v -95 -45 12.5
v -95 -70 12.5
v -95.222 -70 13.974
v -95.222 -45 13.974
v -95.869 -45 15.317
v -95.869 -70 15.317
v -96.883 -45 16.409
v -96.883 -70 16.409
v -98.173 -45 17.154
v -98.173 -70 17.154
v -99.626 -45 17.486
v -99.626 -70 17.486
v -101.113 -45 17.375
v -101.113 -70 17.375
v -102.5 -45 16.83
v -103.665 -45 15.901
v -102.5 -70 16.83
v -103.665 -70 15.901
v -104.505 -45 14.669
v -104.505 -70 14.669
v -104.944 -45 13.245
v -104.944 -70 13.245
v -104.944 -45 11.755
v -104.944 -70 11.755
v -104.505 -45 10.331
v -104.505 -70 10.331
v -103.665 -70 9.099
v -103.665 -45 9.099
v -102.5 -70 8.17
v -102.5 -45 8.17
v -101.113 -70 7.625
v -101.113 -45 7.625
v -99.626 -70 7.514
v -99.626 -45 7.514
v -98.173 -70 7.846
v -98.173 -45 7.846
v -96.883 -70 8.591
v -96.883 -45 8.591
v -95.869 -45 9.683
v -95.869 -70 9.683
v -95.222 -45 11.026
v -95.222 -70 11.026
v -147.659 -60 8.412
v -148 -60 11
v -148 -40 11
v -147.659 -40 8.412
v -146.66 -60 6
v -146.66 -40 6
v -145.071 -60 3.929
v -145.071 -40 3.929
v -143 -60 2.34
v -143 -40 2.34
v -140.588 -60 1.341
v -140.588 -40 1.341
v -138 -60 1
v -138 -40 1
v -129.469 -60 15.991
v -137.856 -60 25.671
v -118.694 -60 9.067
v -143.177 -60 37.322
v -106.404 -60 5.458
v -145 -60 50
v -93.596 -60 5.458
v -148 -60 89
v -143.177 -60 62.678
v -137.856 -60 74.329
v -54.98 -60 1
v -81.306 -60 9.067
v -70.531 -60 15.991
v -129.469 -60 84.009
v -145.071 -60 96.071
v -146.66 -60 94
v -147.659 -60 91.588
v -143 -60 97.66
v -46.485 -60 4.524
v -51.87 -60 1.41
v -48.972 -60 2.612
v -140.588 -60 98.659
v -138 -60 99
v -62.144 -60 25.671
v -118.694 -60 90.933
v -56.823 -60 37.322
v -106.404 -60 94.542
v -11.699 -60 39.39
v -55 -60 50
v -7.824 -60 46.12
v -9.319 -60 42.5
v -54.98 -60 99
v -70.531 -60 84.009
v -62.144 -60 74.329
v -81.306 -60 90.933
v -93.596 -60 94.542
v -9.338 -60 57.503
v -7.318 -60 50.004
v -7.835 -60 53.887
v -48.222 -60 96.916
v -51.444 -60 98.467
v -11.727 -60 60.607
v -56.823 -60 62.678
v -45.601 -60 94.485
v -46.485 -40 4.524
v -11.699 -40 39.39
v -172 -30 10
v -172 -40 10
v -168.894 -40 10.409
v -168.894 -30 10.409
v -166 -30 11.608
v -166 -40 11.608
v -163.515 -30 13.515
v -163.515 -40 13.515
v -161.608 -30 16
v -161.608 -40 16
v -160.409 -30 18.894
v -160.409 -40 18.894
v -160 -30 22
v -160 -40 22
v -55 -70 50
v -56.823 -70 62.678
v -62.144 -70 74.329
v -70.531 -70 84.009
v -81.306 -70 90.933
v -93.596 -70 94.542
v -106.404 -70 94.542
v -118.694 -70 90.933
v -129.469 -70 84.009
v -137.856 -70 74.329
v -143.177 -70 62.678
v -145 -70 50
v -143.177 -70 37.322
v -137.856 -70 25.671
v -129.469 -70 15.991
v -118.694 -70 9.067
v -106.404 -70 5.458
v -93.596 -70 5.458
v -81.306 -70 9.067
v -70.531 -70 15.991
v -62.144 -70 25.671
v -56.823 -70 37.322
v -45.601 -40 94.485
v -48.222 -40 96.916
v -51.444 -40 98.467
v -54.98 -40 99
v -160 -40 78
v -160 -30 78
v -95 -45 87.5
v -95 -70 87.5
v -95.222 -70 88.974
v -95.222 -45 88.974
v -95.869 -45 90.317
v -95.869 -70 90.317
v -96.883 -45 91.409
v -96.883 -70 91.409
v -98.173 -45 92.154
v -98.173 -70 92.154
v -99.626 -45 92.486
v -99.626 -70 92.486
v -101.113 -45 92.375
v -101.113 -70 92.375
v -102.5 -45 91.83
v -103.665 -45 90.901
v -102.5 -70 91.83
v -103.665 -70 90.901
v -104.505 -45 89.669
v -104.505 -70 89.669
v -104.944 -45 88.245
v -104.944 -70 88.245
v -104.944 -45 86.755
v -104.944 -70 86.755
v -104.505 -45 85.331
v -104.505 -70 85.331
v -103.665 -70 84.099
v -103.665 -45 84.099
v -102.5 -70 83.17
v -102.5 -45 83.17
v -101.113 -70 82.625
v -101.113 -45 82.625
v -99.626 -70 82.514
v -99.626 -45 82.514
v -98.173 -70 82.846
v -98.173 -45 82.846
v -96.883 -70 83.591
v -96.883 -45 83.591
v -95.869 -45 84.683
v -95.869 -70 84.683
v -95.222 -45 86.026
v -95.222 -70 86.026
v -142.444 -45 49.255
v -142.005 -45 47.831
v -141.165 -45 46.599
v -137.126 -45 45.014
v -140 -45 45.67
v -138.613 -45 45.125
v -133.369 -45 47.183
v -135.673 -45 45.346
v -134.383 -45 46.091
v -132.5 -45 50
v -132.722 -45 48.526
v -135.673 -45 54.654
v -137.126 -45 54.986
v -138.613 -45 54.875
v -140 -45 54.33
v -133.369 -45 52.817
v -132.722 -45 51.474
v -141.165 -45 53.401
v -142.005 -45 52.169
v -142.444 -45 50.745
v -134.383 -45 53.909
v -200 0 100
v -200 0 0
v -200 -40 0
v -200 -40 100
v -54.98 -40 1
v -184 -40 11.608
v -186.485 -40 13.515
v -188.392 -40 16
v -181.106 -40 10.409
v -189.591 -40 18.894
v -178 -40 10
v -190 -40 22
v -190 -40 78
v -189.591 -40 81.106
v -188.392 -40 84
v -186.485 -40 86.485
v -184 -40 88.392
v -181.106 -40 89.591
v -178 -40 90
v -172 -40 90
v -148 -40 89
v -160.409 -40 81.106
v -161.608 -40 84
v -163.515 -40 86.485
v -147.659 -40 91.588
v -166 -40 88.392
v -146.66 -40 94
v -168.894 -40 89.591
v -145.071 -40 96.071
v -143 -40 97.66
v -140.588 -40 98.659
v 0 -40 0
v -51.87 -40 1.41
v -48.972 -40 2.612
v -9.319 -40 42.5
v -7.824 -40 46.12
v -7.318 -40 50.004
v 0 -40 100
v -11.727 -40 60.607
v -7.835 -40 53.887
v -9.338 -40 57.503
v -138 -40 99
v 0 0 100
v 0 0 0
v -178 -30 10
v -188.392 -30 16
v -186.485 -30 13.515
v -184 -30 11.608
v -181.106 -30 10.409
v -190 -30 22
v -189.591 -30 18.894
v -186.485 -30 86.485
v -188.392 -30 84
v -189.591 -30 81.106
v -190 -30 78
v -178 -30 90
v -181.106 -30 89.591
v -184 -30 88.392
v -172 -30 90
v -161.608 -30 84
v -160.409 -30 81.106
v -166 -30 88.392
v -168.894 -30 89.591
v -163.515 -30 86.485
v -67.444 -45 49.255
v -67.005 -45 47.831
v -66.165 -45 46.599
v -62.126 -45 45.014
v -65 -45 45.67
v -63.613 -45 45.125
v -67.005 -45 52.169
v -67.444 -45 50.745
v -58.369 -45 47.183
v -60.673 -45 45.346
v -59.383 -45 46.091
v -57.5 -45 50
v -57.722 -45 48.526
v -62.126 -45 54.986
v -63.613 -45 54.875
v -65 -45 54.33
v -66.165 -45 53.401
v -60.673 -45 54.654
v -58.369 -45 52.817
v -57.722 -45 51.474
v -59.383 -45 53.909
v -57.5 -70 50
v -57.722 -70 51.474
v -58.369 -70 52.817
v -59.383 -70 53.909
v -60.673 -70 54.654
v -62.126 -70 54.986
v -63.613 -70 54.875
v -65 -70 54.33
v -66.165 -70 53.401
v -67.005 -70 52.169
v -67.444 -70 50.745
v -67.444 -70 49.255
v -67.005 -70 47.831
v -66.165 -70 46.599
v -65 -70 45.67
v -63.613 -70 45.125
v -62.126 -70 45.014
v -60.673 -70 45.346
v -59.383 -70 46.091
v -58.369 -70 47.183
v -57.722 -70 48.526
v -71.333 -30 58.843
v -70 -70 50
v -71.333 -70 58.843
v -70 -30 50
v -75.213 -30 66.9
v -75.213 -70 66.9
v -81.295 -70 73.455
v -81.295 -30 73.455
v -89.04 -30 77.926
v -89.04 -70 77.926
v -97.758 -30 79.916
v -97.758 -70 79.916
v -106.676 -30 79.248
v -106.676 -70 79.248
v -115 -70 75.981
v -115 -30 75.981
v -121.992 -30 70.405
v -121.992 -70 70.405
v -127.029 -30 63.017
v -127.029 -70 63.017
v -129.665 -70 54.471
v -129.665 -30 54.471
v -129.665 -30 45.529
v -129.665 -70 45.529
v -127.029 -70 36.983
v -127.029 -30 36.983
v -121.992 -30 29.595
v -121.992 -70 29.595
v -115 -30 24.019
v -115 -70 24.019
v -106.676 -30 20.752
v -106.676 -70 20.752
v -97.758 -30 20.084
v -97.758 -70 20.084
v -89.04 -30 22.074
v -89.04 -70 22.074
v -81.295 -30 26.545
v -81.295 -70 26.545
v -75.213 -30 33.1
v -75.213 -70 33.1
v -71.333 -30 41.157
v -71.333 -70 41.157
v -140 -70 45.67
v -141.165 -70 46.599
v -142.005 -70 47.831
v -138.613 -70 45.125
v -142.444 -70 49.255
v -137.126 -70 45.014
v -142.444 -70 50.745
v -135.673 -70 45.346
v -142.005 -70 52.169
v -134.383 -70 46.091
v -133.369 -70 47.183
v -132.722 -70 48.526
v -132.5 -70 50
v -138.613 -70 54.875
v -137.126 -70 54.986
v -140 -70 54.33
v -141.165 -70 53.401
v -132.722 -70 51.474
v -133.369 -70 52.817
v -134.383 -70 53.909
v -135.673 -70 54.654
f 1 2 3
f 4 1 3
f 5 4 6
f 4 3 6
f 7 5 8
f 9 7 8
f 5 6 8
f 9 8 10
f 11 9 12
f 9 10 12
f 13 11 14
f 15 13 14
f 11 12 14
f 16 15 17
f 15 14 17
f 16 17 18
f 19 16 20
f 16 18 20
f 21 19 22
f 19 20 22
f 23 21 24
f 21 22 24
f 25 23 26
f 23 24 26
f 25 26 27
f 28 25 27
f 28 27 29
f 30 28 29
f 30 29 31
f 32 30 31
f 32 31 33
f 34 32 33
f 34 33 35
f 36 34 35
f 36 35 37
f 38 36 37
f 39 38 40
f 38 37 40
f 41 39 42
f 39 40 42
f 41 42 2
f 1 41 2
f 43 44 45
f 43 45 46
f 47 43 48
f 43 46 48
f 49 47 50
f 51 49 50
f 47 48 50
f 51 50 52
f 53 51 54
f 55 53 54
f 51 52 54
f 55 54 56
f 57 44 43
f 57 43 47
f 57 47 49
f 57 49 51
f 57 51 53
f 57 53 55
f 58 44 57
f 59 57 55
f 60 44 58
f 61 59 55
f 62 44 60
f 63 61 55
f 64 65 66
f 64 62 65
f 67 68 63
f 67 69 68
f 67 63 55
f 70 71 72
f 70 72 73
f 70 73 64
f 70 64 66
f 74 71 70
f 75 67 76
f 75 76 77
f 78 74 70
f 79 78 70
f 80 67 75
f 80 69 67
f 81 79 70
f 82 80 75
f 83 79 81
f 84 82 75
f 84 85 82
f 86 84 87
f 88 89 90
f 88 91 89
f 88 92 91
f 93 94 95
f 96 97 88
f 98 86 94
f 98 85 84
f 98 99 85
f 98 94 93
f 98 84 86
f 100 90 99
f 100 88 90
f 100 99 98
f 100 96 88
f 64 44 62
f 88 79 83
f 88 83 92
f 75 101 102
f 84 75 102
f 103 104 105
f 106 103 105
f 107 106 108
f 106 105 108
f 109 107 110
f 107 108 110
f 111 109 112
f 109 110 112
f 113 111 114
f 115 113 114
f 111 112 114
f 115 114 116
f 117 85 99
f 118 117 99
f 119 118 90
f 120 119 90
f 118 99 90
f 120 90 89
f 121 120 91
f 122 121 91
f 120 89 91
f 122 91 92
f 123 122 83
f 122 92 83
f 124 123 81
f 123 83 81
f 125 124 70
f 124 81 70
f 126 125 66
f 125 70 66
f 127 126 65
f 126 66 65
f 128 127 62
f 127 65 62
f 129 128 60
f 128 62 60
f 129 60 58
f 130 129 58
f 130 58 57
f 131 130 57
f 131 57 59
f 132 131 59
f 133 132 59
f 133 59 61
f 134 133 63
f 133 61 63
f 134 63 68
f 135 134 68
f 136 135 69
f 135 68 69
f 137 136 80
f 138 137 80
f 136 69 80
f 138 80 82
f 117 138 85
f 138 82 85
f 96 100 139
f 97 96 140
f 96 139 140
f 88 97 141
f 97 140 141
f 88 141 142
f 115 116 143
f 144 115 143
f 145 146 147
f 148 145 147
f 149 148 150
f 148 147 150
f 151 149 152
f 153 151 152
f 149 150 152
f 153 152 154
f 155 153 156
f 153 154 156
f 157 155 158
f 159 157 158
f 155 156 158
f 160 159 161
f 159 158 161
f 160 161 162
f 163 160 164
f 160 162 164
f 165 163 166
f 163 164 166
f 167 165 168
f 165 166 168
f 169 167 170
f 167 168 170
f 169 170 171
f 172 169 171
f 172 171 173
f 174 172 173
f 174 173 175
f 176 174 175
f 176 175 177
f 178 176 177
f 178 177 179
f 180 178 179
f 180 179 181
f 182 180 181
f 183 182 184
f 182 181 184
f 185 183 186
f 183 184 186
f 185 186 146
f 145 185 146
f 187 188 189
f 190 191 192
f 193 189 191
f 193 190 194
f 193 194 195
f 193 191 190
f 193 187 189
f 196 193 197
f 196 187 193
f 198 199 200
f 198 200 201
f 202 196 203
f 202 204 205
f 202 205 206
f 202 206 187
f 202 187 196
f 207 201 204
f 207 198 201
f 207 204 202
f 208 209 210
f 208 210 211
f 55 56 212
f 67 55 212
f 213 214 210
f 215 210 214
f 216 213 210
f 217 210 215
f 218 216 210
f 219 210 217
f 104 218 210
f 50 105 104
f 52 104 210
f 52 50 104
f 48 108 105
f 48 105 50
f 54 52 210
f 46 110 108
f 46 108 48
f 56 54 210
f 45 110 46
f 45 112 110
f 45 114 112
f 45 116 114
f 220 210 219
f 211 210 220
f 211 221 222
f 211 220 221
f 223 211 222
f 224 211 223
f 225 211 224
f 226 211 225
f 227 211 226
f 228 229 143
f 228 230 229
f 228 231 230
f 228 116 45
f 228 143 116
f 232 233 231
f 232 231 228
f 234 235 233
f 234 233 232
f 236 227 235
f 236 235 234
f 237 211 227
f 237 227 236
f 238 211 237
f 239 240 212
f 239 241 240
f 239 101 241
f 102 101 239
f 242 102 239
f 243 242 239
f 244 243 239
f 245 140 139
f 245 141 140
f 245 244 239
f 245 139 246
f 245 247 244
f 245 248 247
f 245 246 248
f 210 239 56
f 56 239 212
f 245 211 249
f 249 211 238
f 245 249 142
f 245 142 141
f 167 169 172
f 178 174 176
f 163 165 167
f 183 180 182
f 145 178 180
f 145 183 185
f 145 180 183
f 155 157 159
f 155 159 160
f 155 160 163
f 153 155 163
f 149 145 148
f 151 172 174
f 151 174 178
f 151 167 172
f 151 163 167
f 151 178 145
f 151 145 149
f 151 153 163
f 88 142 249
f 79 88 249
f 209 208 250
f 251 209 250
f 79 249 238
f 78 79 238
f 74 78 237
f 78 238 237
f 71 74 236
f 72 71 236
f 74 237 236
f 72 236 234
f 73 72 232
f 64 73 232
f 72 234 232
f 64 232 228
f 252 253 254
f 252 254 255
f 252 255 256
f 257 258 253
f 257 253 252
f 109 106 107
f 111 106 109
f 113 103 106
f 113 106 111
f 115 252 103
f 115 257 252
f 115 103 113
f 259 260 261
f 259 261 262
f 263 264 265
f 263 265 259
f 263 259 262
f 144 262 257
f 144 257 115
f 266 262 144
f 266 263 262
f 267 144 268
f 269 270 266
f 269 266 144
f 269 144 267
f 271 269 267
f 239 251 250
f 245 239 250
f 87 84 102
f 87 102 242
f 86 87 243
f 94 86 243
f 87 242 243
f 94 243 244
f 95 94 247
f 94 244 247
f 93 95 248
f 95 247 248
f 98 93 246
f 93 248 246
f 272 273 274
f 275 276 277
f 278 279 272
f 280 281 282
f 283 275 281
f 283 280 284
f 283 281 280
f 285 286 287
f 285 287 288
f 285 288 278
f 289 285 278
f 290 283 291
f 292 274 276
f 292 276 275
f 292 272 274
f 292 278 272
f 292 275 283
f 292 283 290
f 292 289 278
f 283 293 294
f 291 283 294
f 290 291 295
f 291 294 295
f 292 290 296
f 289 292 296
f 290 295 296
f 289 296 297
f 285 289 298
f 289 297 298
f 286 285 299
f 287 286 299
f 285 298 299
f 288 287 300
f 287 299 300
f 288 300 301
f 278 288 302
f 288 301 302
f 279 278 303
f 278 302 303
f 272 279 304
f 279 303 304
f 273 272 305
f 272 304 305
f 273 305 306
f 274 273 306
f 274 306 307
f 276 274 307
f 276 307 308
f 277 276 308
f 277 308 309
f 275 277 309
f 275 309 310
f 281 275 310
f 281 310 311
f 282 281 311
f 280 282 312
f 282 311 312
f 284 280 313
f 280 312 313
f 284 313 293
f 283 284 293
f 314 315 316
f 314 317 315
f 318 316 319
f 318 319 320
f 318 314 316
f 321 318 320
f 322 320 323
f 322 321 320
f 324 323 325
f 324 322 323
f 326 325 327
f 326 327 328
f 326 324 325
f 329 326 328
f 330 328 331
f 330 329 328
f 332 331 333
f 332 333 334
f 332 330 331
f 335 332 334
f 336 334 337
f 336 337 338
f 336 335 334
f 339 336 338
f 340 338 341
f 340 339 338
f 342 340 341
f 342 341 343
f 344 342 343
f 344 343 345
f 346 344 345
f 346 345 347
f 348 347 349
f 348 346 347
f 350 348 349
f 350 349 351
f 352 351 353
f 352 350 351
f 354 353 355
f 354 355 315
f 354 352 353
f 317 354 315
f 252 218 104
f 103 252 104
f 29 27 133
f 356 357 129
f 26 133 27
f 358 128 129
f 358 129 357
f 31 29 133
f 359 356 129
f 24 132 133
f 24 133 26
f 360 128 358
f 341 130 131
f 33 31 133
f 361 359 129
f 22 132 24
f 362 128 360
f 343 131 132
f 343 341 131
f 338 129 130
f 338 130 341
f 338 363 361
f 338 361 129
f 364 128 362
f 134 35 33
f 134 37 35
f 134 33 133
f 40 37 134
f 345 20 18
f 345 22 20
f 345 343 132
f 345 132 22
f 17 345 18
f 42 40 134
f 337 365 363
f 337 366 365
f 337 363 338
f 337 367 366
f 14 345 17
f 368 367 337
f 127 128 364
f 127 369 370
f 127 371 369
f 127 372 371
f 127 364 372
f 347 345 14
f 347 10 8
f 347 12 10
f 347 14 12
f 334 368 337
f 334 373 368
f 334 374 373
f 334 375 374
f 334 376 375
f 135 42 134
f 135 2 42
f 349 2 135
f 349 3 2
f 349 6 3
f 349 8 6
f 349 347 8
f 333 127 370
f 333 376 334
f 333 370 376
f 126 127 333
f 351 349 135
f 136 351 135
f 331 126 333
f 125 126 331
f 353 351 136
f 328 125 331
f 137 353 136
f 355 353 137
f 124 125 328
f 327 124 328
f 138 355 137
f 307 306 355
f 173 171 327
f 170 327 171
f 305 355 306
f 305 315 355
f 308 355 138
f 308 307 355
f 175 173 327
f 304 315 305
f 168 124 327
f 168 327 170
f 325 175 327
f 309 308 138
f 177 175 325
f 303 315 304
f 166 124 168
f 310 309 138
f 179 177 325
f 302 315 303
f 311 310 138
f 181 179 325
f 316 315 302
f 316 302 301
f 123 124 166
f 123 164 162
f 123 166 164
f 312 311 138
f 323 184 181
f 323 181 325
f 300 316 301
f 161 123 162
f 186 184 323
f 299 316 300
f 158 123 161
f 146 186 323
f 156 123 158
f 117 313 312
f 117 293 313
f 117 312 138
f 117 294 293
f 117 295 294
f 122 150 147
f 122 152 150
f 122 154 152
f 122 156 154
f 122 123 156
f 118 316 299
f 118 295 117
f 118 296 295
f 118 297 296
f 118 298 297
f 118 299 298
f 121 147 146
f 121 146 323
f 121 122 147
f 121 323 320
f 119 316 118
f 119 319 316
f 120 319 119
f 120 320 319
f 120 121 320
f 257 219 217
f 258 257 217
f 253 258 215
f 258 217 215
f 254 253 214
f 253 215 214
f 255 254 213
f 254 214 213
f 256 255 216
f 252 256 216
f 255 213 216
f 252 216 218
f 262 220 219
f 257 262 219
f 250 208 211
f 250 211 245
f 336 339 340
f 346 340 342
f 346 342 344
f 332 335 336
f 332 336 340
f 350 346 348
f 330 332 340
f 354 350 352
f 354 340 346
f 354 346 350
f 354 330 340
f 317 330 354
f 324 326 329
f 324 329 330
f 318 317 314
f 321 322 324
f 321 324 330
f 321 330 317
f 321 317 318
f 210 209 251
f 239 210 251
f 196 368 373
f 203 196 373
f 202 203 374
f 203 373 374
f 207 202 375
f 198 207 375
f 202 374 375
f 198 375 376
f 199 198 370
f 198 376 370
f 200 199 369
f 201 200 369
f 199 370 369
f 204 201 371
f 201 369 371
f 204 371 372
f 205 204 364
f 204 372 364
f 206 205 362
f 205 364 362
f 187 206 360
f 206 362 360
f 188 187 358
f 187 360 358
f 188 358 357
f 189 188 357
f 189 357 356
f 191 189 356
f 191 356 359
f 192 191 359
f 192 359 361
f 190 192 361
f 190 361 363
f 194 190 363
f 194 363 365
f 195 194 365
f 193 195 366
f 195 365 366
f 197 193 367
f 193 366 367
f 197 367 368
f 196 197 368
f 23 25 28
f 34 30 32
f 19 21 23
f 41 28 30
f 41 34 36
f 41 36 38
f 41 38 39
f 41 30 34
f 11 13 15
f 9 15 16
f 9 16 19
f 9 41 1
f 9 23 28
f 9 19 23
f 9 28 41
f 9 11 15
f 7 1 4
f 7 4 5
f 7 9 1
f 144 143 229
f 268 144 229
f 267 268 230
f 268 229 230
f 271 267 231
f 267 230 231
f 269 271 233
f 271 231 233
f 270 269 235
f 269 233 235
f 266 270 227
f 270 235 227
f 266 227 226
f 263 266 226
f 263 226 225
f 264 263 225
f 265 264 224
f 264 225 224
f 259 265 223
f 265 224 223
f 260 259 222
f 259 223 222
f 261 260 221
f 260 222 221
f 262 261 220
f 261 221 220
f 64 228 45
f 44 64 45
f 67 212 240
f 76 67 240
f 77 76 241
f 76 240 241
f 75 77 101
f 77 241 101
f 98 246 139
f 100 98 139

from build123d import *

# Parameters (mm, degrees)
F0_W     = 200
F0_H     = 100
F1_DEPTH = 40
F2_R     = 30
F3_DEPTH = 10
F4_R     = 30
F5_DEPTH = 20
F6_R     = 45
F6_R_2   = 30
F7_DEPTH = 10
F8_R     = 5
F9_DEPTH = 25


with BuildPart() as f1:
    # F0 (on Front) → F1 (new body)
    with BuildSketch(Plane.XZ):
        with Locations((-100, 50)):
            Rectangle(F0_W, F0_H)
    extrude(amount=F1_DEPTH)

    # F2 (on face) → F3 (cut)
    with BuildSketch(Plane.XZ.offset(40)):
        with BuildLine():
            Line((-172, 90), (-178, 90))
            ThreePointArc((-178, 90), (-186.4852813742, 86.4852813742), (-190, 78))
            Line((-190, 78), (-190, 22))
            ThreePointArc((-190, 22), (-186.4852813742, 13.5147186258), (-178, 10))
            Line((-178, 10), (-172, 10))
            ThreePointArc((-172, 10), (-163.5147186258, 13.5147186258), (-160, 22))
            Line((-160, 22), (-160, 78))
            ThreePointArc((-160, 78), (-163.5147186258, 86.4852813742), (-172, 90))
        make_face()
        with Locations((-100, 50)):
            Circle(F2_R)
    extrude(amount=-F3_DEPTH, mode=Mode.SUBTRACT)

    # F4 (on face) → F5 (join)
    with BuildSketch(Plane.XZ.offset(40)):
        with BuildLine():
            ThreePointArc((-138, 99), (-145.0710678119, 96.0710678119), (-148, 89))
            Line((-148, 89), (-148, 11))
            ThreePointArc((-148, 11), (-145.0710678119, 3.9289321881), (-138, 1))
            Line((-138, 1), (-54.98, 1))
            ThreePointArc((-54.98, 1), (-50.3814469261, 1.9160787793), (-46.485, 4.5244483955))
            Line((-46.485, 4.5244483955), (-11.6992693535, 39.39))
            ThreePointArc((-11.6992693535, 39.39), (-7.3180325381, 50.004327625), (-11.7274004602, 60.607))
            Line((-11.7274004602, 60.607), (-45.6005130737, 94.485))
            ThreePointArc((-45.6005130737, 94.485), (-49.7751945281, 97.8124927746), (-54.98, 99))
            Line((-54.98, 99), (-138, 99))
        make_face()
        with Locations((-100, 50)):
            Circle(F4_R, mode=Mode.SUBTRACT)
    extrude(amount=F5_DEPTH)

    # F6 (on face) → F7 (join)
    with BuildSketch(Plane.XZ.offset(60)):
        with Locations((-100, 50)):
            Circle(F6_R)
        with Locations((-100, 50)):
            Circle(F6_R_2, mode=Mode.SUBTRACT)
    extrude(amount=F7_DEPTH)

    # F8 (on face) → F9 (cut)
    with BuildSketch(Plane.XZ.offset(70)):
        with Locations((-100, 87.5)):
            Circle(F8_R)
        with Locations((-137.5, 50)):
            Circle(F8_R)
        with Locations((-100, 12.5)):
            Circle(F8_R)
        with Locations((-62.5, 50)):
            Circle(F8_R)
    extrude(amount=-F9_DEPTH, mode=Mode.SUBTRACT)


solid = f1.part
